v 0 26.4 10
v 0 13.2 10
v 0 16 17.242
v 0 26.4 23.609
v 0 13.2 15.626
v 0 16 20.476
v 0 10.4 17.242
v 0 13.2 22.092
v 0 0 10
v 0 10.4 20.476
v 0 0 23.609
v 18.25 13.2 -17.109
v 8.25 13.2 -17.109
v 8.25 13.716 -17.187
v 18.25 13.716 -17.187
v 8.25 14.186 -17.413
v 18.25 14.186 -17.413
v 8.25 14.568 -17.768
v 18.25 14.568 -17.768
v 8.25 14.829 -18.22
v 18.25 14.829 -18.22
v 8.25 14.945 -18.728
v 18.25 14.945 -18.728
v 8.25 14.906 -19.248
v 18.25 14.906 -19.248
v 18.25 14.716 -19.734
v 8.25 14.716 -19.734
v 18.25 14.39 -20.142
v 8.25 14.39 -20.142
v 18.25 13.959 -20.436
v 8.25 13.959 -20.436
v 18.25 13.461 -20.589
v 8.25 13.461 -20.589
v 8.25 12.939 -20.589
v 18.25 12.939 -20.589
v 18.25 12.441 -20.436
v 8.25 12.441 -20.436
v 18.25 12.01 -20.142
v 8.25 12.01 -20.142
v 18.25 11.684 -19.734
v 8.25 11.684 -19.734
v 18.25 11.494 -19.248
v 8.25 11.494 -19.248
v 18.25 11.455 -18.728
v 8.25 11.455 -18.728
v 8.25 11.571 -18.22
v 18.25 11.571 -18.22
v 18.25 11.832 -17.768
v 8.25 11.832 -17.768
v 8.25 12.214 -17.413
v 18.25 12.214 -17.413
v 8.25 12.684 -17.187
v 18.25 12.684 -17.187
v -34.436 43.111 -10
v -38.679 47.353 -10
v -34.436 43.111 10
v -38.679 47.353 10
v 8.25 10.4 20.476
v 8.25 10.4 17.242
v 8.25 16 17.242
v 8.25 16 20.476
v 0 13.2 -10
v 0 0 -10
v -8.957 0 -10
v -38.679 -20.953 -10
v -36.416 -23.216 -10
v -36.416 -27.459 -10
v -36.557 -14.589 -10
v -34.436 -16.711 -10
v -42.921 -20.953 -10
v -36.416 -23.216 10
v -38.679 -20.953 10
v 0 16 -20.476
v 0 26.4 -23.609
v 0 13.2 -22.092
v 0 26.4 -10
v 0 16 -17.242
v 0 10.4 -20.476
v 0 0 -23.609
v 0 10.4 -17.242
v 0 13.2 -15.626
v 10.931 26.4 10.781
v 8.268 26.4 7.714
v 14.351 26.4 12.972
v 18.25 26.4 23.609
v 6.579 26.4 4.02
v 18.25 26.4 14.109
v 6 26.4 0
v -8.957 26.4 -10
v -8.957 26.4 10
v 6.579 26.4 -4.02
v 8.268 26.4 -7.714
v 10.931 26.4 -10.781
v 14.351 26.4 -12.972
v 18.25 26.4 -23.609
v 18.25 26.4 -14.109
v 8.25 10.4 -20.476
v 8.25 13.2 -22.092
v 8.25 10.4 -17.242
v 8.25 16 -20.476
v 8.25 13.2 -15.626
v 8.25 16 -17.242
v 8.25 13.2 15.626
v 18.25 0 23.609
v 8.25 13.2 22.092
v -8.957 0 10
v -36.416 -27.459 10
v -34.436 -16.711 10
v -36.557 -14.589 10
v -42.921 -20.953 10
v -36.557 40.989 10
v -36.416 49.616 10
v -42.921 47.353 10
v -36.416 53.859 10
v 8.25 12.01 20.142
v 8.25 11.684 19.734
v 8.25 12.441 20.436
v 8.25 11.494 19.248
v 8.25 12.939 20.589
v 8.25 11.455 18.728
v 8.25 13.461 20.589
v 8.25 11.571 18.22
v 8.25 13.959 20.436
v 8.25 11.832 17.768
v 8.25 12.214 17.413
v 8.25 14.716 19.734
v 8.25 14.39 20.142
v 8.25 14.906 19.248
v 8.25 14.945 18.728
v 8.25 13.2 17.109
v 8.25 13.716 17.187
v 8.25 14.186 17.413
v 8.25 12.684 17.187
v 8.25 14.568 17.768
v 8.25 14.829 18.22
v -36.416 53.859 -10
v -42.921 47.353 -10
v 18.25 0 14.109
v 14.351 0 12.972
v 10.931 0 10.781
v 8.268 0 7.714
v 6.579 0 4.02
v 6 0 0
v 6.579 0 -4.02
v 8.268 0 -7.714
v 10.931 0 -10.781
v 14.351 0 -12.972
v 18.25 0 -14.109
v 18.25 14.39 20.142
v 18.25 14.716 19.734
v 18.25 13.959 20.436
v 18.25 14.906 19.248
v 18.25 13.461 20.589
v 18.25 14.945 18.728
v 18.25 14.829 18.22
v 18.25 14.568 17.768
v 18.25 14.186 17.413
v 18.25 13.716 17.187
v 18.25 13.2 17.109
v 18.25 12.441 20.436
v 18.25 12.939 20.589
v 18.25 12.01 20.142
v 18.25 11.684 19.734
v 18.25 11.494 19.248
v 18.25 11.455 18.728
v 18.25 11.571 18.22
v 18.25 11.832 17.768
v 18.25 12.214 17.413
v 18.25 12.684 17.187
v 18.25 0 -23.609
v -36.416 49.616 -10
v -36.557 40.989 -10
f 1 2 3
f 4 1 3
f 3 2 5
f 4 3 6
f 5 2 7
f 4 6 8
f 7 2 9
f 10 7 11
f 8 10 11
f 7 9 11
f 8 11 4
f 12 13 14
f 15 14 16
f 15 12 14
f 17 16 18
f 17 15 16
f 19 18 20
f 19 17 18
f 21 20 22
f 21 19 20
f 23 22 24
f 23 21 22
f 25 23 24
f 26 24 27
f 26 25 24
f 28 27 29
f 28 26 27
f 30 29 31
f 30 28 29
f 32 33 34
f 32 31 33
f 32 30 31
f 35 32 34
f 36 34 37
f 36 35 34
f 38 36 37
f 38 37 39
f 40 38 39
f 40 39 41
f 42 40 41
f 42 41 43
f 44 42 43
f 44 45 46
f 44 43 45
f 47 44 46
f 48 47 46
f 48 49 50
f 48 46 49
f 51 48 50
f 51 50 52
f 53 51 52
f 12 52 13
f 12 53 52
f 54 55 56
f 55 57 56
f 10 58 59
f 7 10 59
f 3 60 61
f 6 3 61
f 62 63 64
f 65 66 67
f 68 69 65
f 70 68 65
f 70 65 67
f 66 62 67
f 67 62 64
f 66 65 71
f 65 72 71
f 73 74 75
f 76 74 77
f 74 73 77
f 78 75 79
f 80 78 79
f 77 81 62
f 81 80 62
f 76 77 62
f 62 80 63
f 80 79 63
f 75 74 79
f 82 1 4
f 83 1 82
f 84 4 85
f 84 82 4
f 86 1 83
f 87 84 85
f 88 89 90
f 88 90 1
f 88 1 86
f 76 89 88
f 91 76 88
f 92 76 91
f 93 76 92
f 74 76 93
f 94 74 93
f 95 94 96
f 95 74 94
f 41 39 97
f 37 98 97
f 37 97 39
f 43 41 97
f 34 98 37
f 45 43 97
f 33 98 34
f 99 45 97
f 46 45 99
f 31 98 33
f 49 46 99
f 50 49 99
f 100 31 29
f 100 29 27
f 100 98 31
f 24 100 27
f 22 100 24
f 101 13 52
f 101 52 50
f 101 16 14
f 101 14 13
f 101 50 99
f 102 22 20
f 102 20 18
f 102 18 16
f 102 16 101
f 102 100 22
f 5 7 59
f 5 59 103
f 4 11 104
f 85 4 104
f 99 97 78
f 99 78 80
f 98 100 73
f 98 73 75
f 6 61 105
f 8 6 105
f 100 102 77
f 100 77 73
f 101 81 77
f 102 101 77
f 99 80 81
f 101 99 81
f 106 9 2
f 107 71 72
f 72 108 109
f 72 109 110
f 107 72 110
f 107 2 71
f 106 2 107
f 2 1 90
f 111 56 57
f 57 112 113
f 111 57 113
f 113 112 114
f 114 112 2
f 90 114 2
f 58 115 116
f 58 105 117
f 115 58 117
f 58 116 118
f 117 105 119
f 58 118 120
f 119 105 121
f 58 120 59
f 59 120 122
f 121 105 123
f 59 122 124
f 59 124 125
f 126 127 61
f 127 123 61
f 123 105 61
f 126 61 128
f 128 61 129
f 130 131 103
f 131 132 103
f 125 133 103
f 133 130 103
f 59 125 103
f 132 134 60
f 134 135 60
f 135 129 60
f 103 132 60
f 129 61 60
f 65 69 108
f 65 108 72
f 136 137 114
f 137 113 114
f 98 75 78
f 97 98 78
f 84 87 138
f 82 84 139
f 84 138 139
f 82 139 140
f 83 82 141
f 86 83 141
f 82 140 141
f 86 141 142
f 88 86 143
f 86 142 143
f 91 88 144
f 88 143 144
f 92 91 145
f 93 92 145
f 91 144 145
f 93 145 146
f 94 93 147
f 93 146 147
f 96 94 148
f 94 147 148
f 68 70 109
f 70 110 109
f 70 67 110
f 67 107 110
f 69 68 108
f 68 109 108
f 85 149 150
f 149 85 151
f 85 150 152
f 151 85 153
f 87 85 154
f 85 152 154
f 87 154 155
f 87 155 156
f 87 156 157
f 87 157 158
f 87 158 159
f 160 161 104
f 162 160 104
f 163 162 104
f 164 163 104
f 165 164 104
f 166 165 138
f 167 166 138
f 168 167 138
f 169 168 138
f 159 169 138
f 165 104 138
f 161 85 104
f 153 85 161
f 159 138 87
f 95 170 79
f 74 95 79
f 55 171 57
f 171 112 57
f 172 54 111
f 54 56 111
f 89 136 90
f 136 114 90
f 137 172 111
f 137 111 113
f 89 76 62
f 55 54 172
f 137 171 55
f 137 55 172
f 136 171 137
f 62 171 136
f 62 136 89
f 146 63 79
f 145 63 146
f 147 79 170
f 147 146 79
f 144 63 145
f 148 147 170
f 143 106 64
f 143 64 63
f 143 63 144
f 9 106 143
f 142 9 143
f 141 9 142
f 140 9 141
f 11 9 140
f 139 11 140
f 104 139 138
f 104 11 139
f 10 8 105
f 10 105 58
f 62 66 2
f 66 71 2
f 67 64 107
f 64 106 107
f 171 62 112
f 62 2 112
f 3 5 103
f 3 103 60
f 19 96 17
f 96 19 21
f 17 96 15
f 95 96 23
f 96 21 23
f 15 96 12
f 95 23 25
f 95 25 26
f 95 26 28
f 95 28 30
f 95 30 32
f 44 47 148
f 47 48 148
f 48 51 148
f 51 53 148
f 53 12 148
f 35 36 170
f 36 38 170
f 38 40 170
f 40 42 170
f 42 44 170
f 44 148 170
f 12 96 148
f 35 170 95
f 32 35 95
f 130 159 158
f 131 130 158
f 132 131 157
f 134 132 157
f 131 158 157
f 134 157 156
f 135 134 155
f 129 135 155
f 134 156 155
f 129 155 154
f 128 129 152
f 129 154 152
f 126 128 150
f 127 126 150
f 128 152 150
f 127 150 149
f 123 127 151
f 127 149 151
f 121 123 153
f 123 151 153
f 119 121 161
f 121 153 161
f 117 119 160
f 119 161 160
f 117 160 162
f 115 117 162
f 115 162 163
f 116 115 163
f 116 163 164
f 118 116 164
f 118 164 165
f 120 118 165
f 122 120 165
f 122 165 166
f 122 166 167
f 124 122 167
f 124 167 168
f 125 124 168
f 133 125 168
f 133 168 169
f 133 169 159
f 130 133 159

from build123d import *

# Parameters (mm, degrees)
BOSS_EXTRUDE1_DEPTH = 26.4
SKETCH2_R           = 1.75
CUT_EXTRUDE1_DEPTH  = 40.842252323
CUT_EXTRUDE3_START  = -10
CUT_EXTRUDE3_DEPTH  = 30.842252323
BOSS_EXTRUDE2_DEPTH = 10


with BuildPart() as part:
    # Sketch1 → Boss-Extrude1 (new body)
    with BuildSketch(Plane(origin=(0, 0, 0), x_dir=(1, 0, 0), z_dir=(0, 1, 0))):
        with BuildLine():
            Line((0, 23.60895106), (0, -23.60895106))
            Line((0, -23.60895106), (18.25, -23.60895106))
            Line((18.25, -23.60895106), (18.25, -14.10895106))
            ThreePointArc((18.25, -14.10895106), (6, 0), (18.25, 14.10895106))
            Line((18.25, 14.10895106), (18.25, 23.60895106))
            Line((18.25, 23.60895106), (0, 23.60895106))
        make_face()
    extrude(amount=BOSS_EXTRUDE1_DEPTH)

    # Sketch2 → Cut-Extrude1 (cut, through all)
    with BuildSketch(Plane(origin=(18.25, 0, 0), x_dir=(0, 0, -1), z_dir=(1, 0, 0))):
        with Locations((-18.85895106, 13.2)):
            Circle(SKETCH2_R)
    cut_extrude1 = extrude(amount=-CUT_EXTRUDE1_DEPTH, mode=Mode.SUBTRACT)

    # Sketch5 → Cut-Extrude3 (cut, through all)
    with BuildSketch(Plane(origin=(18.25, 0, 0), x_dir=(0, 0, -1), z_dir=(1, 0, 0)).offset(CUT_EXTRUDE3_START)):
        Polygon((-17.242370306, 16), (-20.475531813, 16), (-22.092112567, 13.2), (-20.475531813, 10.4), (-17.242370306, 10.4), (-15.625789552, 13.2), align=None)
    cut_extrude3 = extrude(amount=-CUT_EXTRUDE3_DEPTH, mode=Mode.SUBTRACT)

    # Mirror1: Cut-Extrude1, Cut-Extrude3 across plane
    add(cut_extrude1.mirror(Plane.XY), mode=Mode.SUBTRACT)
    add(cut_extrude3.mirror(Plane.XY), mode=Mode.SUBTRACT)

    # Sketch7 → Boss-Extrude2 (add, symmetric)
    with BuildSketch(Plane.XY):
        Polygon((0, 0), (-8.957359313, 0), (-36.415999231, -27.458639918), (-42.921381618, -20.953257531), (-36.557420587, -14.589296501), (-34.436100244, -16.710616844), (-38.678740931, -20.953257531), (-36.415999231, -23.215999231), (0, 13.2), (-36.415999231, 49.615999231), (-38.678740931, 47.353257531), (-34.436100244, 43.110616844), (-36.557420587, 40.989296501), (-42.921381618, 47.353257531), (-36.415999231, 53.858639918), (-8.957359313, 26.4), (0, 26.4), (6, 26.4), (6, 0), align=None)
    extrude(amount=BOSS_EXTRUDE2_DEPTH, both=True)


solid = part.part
